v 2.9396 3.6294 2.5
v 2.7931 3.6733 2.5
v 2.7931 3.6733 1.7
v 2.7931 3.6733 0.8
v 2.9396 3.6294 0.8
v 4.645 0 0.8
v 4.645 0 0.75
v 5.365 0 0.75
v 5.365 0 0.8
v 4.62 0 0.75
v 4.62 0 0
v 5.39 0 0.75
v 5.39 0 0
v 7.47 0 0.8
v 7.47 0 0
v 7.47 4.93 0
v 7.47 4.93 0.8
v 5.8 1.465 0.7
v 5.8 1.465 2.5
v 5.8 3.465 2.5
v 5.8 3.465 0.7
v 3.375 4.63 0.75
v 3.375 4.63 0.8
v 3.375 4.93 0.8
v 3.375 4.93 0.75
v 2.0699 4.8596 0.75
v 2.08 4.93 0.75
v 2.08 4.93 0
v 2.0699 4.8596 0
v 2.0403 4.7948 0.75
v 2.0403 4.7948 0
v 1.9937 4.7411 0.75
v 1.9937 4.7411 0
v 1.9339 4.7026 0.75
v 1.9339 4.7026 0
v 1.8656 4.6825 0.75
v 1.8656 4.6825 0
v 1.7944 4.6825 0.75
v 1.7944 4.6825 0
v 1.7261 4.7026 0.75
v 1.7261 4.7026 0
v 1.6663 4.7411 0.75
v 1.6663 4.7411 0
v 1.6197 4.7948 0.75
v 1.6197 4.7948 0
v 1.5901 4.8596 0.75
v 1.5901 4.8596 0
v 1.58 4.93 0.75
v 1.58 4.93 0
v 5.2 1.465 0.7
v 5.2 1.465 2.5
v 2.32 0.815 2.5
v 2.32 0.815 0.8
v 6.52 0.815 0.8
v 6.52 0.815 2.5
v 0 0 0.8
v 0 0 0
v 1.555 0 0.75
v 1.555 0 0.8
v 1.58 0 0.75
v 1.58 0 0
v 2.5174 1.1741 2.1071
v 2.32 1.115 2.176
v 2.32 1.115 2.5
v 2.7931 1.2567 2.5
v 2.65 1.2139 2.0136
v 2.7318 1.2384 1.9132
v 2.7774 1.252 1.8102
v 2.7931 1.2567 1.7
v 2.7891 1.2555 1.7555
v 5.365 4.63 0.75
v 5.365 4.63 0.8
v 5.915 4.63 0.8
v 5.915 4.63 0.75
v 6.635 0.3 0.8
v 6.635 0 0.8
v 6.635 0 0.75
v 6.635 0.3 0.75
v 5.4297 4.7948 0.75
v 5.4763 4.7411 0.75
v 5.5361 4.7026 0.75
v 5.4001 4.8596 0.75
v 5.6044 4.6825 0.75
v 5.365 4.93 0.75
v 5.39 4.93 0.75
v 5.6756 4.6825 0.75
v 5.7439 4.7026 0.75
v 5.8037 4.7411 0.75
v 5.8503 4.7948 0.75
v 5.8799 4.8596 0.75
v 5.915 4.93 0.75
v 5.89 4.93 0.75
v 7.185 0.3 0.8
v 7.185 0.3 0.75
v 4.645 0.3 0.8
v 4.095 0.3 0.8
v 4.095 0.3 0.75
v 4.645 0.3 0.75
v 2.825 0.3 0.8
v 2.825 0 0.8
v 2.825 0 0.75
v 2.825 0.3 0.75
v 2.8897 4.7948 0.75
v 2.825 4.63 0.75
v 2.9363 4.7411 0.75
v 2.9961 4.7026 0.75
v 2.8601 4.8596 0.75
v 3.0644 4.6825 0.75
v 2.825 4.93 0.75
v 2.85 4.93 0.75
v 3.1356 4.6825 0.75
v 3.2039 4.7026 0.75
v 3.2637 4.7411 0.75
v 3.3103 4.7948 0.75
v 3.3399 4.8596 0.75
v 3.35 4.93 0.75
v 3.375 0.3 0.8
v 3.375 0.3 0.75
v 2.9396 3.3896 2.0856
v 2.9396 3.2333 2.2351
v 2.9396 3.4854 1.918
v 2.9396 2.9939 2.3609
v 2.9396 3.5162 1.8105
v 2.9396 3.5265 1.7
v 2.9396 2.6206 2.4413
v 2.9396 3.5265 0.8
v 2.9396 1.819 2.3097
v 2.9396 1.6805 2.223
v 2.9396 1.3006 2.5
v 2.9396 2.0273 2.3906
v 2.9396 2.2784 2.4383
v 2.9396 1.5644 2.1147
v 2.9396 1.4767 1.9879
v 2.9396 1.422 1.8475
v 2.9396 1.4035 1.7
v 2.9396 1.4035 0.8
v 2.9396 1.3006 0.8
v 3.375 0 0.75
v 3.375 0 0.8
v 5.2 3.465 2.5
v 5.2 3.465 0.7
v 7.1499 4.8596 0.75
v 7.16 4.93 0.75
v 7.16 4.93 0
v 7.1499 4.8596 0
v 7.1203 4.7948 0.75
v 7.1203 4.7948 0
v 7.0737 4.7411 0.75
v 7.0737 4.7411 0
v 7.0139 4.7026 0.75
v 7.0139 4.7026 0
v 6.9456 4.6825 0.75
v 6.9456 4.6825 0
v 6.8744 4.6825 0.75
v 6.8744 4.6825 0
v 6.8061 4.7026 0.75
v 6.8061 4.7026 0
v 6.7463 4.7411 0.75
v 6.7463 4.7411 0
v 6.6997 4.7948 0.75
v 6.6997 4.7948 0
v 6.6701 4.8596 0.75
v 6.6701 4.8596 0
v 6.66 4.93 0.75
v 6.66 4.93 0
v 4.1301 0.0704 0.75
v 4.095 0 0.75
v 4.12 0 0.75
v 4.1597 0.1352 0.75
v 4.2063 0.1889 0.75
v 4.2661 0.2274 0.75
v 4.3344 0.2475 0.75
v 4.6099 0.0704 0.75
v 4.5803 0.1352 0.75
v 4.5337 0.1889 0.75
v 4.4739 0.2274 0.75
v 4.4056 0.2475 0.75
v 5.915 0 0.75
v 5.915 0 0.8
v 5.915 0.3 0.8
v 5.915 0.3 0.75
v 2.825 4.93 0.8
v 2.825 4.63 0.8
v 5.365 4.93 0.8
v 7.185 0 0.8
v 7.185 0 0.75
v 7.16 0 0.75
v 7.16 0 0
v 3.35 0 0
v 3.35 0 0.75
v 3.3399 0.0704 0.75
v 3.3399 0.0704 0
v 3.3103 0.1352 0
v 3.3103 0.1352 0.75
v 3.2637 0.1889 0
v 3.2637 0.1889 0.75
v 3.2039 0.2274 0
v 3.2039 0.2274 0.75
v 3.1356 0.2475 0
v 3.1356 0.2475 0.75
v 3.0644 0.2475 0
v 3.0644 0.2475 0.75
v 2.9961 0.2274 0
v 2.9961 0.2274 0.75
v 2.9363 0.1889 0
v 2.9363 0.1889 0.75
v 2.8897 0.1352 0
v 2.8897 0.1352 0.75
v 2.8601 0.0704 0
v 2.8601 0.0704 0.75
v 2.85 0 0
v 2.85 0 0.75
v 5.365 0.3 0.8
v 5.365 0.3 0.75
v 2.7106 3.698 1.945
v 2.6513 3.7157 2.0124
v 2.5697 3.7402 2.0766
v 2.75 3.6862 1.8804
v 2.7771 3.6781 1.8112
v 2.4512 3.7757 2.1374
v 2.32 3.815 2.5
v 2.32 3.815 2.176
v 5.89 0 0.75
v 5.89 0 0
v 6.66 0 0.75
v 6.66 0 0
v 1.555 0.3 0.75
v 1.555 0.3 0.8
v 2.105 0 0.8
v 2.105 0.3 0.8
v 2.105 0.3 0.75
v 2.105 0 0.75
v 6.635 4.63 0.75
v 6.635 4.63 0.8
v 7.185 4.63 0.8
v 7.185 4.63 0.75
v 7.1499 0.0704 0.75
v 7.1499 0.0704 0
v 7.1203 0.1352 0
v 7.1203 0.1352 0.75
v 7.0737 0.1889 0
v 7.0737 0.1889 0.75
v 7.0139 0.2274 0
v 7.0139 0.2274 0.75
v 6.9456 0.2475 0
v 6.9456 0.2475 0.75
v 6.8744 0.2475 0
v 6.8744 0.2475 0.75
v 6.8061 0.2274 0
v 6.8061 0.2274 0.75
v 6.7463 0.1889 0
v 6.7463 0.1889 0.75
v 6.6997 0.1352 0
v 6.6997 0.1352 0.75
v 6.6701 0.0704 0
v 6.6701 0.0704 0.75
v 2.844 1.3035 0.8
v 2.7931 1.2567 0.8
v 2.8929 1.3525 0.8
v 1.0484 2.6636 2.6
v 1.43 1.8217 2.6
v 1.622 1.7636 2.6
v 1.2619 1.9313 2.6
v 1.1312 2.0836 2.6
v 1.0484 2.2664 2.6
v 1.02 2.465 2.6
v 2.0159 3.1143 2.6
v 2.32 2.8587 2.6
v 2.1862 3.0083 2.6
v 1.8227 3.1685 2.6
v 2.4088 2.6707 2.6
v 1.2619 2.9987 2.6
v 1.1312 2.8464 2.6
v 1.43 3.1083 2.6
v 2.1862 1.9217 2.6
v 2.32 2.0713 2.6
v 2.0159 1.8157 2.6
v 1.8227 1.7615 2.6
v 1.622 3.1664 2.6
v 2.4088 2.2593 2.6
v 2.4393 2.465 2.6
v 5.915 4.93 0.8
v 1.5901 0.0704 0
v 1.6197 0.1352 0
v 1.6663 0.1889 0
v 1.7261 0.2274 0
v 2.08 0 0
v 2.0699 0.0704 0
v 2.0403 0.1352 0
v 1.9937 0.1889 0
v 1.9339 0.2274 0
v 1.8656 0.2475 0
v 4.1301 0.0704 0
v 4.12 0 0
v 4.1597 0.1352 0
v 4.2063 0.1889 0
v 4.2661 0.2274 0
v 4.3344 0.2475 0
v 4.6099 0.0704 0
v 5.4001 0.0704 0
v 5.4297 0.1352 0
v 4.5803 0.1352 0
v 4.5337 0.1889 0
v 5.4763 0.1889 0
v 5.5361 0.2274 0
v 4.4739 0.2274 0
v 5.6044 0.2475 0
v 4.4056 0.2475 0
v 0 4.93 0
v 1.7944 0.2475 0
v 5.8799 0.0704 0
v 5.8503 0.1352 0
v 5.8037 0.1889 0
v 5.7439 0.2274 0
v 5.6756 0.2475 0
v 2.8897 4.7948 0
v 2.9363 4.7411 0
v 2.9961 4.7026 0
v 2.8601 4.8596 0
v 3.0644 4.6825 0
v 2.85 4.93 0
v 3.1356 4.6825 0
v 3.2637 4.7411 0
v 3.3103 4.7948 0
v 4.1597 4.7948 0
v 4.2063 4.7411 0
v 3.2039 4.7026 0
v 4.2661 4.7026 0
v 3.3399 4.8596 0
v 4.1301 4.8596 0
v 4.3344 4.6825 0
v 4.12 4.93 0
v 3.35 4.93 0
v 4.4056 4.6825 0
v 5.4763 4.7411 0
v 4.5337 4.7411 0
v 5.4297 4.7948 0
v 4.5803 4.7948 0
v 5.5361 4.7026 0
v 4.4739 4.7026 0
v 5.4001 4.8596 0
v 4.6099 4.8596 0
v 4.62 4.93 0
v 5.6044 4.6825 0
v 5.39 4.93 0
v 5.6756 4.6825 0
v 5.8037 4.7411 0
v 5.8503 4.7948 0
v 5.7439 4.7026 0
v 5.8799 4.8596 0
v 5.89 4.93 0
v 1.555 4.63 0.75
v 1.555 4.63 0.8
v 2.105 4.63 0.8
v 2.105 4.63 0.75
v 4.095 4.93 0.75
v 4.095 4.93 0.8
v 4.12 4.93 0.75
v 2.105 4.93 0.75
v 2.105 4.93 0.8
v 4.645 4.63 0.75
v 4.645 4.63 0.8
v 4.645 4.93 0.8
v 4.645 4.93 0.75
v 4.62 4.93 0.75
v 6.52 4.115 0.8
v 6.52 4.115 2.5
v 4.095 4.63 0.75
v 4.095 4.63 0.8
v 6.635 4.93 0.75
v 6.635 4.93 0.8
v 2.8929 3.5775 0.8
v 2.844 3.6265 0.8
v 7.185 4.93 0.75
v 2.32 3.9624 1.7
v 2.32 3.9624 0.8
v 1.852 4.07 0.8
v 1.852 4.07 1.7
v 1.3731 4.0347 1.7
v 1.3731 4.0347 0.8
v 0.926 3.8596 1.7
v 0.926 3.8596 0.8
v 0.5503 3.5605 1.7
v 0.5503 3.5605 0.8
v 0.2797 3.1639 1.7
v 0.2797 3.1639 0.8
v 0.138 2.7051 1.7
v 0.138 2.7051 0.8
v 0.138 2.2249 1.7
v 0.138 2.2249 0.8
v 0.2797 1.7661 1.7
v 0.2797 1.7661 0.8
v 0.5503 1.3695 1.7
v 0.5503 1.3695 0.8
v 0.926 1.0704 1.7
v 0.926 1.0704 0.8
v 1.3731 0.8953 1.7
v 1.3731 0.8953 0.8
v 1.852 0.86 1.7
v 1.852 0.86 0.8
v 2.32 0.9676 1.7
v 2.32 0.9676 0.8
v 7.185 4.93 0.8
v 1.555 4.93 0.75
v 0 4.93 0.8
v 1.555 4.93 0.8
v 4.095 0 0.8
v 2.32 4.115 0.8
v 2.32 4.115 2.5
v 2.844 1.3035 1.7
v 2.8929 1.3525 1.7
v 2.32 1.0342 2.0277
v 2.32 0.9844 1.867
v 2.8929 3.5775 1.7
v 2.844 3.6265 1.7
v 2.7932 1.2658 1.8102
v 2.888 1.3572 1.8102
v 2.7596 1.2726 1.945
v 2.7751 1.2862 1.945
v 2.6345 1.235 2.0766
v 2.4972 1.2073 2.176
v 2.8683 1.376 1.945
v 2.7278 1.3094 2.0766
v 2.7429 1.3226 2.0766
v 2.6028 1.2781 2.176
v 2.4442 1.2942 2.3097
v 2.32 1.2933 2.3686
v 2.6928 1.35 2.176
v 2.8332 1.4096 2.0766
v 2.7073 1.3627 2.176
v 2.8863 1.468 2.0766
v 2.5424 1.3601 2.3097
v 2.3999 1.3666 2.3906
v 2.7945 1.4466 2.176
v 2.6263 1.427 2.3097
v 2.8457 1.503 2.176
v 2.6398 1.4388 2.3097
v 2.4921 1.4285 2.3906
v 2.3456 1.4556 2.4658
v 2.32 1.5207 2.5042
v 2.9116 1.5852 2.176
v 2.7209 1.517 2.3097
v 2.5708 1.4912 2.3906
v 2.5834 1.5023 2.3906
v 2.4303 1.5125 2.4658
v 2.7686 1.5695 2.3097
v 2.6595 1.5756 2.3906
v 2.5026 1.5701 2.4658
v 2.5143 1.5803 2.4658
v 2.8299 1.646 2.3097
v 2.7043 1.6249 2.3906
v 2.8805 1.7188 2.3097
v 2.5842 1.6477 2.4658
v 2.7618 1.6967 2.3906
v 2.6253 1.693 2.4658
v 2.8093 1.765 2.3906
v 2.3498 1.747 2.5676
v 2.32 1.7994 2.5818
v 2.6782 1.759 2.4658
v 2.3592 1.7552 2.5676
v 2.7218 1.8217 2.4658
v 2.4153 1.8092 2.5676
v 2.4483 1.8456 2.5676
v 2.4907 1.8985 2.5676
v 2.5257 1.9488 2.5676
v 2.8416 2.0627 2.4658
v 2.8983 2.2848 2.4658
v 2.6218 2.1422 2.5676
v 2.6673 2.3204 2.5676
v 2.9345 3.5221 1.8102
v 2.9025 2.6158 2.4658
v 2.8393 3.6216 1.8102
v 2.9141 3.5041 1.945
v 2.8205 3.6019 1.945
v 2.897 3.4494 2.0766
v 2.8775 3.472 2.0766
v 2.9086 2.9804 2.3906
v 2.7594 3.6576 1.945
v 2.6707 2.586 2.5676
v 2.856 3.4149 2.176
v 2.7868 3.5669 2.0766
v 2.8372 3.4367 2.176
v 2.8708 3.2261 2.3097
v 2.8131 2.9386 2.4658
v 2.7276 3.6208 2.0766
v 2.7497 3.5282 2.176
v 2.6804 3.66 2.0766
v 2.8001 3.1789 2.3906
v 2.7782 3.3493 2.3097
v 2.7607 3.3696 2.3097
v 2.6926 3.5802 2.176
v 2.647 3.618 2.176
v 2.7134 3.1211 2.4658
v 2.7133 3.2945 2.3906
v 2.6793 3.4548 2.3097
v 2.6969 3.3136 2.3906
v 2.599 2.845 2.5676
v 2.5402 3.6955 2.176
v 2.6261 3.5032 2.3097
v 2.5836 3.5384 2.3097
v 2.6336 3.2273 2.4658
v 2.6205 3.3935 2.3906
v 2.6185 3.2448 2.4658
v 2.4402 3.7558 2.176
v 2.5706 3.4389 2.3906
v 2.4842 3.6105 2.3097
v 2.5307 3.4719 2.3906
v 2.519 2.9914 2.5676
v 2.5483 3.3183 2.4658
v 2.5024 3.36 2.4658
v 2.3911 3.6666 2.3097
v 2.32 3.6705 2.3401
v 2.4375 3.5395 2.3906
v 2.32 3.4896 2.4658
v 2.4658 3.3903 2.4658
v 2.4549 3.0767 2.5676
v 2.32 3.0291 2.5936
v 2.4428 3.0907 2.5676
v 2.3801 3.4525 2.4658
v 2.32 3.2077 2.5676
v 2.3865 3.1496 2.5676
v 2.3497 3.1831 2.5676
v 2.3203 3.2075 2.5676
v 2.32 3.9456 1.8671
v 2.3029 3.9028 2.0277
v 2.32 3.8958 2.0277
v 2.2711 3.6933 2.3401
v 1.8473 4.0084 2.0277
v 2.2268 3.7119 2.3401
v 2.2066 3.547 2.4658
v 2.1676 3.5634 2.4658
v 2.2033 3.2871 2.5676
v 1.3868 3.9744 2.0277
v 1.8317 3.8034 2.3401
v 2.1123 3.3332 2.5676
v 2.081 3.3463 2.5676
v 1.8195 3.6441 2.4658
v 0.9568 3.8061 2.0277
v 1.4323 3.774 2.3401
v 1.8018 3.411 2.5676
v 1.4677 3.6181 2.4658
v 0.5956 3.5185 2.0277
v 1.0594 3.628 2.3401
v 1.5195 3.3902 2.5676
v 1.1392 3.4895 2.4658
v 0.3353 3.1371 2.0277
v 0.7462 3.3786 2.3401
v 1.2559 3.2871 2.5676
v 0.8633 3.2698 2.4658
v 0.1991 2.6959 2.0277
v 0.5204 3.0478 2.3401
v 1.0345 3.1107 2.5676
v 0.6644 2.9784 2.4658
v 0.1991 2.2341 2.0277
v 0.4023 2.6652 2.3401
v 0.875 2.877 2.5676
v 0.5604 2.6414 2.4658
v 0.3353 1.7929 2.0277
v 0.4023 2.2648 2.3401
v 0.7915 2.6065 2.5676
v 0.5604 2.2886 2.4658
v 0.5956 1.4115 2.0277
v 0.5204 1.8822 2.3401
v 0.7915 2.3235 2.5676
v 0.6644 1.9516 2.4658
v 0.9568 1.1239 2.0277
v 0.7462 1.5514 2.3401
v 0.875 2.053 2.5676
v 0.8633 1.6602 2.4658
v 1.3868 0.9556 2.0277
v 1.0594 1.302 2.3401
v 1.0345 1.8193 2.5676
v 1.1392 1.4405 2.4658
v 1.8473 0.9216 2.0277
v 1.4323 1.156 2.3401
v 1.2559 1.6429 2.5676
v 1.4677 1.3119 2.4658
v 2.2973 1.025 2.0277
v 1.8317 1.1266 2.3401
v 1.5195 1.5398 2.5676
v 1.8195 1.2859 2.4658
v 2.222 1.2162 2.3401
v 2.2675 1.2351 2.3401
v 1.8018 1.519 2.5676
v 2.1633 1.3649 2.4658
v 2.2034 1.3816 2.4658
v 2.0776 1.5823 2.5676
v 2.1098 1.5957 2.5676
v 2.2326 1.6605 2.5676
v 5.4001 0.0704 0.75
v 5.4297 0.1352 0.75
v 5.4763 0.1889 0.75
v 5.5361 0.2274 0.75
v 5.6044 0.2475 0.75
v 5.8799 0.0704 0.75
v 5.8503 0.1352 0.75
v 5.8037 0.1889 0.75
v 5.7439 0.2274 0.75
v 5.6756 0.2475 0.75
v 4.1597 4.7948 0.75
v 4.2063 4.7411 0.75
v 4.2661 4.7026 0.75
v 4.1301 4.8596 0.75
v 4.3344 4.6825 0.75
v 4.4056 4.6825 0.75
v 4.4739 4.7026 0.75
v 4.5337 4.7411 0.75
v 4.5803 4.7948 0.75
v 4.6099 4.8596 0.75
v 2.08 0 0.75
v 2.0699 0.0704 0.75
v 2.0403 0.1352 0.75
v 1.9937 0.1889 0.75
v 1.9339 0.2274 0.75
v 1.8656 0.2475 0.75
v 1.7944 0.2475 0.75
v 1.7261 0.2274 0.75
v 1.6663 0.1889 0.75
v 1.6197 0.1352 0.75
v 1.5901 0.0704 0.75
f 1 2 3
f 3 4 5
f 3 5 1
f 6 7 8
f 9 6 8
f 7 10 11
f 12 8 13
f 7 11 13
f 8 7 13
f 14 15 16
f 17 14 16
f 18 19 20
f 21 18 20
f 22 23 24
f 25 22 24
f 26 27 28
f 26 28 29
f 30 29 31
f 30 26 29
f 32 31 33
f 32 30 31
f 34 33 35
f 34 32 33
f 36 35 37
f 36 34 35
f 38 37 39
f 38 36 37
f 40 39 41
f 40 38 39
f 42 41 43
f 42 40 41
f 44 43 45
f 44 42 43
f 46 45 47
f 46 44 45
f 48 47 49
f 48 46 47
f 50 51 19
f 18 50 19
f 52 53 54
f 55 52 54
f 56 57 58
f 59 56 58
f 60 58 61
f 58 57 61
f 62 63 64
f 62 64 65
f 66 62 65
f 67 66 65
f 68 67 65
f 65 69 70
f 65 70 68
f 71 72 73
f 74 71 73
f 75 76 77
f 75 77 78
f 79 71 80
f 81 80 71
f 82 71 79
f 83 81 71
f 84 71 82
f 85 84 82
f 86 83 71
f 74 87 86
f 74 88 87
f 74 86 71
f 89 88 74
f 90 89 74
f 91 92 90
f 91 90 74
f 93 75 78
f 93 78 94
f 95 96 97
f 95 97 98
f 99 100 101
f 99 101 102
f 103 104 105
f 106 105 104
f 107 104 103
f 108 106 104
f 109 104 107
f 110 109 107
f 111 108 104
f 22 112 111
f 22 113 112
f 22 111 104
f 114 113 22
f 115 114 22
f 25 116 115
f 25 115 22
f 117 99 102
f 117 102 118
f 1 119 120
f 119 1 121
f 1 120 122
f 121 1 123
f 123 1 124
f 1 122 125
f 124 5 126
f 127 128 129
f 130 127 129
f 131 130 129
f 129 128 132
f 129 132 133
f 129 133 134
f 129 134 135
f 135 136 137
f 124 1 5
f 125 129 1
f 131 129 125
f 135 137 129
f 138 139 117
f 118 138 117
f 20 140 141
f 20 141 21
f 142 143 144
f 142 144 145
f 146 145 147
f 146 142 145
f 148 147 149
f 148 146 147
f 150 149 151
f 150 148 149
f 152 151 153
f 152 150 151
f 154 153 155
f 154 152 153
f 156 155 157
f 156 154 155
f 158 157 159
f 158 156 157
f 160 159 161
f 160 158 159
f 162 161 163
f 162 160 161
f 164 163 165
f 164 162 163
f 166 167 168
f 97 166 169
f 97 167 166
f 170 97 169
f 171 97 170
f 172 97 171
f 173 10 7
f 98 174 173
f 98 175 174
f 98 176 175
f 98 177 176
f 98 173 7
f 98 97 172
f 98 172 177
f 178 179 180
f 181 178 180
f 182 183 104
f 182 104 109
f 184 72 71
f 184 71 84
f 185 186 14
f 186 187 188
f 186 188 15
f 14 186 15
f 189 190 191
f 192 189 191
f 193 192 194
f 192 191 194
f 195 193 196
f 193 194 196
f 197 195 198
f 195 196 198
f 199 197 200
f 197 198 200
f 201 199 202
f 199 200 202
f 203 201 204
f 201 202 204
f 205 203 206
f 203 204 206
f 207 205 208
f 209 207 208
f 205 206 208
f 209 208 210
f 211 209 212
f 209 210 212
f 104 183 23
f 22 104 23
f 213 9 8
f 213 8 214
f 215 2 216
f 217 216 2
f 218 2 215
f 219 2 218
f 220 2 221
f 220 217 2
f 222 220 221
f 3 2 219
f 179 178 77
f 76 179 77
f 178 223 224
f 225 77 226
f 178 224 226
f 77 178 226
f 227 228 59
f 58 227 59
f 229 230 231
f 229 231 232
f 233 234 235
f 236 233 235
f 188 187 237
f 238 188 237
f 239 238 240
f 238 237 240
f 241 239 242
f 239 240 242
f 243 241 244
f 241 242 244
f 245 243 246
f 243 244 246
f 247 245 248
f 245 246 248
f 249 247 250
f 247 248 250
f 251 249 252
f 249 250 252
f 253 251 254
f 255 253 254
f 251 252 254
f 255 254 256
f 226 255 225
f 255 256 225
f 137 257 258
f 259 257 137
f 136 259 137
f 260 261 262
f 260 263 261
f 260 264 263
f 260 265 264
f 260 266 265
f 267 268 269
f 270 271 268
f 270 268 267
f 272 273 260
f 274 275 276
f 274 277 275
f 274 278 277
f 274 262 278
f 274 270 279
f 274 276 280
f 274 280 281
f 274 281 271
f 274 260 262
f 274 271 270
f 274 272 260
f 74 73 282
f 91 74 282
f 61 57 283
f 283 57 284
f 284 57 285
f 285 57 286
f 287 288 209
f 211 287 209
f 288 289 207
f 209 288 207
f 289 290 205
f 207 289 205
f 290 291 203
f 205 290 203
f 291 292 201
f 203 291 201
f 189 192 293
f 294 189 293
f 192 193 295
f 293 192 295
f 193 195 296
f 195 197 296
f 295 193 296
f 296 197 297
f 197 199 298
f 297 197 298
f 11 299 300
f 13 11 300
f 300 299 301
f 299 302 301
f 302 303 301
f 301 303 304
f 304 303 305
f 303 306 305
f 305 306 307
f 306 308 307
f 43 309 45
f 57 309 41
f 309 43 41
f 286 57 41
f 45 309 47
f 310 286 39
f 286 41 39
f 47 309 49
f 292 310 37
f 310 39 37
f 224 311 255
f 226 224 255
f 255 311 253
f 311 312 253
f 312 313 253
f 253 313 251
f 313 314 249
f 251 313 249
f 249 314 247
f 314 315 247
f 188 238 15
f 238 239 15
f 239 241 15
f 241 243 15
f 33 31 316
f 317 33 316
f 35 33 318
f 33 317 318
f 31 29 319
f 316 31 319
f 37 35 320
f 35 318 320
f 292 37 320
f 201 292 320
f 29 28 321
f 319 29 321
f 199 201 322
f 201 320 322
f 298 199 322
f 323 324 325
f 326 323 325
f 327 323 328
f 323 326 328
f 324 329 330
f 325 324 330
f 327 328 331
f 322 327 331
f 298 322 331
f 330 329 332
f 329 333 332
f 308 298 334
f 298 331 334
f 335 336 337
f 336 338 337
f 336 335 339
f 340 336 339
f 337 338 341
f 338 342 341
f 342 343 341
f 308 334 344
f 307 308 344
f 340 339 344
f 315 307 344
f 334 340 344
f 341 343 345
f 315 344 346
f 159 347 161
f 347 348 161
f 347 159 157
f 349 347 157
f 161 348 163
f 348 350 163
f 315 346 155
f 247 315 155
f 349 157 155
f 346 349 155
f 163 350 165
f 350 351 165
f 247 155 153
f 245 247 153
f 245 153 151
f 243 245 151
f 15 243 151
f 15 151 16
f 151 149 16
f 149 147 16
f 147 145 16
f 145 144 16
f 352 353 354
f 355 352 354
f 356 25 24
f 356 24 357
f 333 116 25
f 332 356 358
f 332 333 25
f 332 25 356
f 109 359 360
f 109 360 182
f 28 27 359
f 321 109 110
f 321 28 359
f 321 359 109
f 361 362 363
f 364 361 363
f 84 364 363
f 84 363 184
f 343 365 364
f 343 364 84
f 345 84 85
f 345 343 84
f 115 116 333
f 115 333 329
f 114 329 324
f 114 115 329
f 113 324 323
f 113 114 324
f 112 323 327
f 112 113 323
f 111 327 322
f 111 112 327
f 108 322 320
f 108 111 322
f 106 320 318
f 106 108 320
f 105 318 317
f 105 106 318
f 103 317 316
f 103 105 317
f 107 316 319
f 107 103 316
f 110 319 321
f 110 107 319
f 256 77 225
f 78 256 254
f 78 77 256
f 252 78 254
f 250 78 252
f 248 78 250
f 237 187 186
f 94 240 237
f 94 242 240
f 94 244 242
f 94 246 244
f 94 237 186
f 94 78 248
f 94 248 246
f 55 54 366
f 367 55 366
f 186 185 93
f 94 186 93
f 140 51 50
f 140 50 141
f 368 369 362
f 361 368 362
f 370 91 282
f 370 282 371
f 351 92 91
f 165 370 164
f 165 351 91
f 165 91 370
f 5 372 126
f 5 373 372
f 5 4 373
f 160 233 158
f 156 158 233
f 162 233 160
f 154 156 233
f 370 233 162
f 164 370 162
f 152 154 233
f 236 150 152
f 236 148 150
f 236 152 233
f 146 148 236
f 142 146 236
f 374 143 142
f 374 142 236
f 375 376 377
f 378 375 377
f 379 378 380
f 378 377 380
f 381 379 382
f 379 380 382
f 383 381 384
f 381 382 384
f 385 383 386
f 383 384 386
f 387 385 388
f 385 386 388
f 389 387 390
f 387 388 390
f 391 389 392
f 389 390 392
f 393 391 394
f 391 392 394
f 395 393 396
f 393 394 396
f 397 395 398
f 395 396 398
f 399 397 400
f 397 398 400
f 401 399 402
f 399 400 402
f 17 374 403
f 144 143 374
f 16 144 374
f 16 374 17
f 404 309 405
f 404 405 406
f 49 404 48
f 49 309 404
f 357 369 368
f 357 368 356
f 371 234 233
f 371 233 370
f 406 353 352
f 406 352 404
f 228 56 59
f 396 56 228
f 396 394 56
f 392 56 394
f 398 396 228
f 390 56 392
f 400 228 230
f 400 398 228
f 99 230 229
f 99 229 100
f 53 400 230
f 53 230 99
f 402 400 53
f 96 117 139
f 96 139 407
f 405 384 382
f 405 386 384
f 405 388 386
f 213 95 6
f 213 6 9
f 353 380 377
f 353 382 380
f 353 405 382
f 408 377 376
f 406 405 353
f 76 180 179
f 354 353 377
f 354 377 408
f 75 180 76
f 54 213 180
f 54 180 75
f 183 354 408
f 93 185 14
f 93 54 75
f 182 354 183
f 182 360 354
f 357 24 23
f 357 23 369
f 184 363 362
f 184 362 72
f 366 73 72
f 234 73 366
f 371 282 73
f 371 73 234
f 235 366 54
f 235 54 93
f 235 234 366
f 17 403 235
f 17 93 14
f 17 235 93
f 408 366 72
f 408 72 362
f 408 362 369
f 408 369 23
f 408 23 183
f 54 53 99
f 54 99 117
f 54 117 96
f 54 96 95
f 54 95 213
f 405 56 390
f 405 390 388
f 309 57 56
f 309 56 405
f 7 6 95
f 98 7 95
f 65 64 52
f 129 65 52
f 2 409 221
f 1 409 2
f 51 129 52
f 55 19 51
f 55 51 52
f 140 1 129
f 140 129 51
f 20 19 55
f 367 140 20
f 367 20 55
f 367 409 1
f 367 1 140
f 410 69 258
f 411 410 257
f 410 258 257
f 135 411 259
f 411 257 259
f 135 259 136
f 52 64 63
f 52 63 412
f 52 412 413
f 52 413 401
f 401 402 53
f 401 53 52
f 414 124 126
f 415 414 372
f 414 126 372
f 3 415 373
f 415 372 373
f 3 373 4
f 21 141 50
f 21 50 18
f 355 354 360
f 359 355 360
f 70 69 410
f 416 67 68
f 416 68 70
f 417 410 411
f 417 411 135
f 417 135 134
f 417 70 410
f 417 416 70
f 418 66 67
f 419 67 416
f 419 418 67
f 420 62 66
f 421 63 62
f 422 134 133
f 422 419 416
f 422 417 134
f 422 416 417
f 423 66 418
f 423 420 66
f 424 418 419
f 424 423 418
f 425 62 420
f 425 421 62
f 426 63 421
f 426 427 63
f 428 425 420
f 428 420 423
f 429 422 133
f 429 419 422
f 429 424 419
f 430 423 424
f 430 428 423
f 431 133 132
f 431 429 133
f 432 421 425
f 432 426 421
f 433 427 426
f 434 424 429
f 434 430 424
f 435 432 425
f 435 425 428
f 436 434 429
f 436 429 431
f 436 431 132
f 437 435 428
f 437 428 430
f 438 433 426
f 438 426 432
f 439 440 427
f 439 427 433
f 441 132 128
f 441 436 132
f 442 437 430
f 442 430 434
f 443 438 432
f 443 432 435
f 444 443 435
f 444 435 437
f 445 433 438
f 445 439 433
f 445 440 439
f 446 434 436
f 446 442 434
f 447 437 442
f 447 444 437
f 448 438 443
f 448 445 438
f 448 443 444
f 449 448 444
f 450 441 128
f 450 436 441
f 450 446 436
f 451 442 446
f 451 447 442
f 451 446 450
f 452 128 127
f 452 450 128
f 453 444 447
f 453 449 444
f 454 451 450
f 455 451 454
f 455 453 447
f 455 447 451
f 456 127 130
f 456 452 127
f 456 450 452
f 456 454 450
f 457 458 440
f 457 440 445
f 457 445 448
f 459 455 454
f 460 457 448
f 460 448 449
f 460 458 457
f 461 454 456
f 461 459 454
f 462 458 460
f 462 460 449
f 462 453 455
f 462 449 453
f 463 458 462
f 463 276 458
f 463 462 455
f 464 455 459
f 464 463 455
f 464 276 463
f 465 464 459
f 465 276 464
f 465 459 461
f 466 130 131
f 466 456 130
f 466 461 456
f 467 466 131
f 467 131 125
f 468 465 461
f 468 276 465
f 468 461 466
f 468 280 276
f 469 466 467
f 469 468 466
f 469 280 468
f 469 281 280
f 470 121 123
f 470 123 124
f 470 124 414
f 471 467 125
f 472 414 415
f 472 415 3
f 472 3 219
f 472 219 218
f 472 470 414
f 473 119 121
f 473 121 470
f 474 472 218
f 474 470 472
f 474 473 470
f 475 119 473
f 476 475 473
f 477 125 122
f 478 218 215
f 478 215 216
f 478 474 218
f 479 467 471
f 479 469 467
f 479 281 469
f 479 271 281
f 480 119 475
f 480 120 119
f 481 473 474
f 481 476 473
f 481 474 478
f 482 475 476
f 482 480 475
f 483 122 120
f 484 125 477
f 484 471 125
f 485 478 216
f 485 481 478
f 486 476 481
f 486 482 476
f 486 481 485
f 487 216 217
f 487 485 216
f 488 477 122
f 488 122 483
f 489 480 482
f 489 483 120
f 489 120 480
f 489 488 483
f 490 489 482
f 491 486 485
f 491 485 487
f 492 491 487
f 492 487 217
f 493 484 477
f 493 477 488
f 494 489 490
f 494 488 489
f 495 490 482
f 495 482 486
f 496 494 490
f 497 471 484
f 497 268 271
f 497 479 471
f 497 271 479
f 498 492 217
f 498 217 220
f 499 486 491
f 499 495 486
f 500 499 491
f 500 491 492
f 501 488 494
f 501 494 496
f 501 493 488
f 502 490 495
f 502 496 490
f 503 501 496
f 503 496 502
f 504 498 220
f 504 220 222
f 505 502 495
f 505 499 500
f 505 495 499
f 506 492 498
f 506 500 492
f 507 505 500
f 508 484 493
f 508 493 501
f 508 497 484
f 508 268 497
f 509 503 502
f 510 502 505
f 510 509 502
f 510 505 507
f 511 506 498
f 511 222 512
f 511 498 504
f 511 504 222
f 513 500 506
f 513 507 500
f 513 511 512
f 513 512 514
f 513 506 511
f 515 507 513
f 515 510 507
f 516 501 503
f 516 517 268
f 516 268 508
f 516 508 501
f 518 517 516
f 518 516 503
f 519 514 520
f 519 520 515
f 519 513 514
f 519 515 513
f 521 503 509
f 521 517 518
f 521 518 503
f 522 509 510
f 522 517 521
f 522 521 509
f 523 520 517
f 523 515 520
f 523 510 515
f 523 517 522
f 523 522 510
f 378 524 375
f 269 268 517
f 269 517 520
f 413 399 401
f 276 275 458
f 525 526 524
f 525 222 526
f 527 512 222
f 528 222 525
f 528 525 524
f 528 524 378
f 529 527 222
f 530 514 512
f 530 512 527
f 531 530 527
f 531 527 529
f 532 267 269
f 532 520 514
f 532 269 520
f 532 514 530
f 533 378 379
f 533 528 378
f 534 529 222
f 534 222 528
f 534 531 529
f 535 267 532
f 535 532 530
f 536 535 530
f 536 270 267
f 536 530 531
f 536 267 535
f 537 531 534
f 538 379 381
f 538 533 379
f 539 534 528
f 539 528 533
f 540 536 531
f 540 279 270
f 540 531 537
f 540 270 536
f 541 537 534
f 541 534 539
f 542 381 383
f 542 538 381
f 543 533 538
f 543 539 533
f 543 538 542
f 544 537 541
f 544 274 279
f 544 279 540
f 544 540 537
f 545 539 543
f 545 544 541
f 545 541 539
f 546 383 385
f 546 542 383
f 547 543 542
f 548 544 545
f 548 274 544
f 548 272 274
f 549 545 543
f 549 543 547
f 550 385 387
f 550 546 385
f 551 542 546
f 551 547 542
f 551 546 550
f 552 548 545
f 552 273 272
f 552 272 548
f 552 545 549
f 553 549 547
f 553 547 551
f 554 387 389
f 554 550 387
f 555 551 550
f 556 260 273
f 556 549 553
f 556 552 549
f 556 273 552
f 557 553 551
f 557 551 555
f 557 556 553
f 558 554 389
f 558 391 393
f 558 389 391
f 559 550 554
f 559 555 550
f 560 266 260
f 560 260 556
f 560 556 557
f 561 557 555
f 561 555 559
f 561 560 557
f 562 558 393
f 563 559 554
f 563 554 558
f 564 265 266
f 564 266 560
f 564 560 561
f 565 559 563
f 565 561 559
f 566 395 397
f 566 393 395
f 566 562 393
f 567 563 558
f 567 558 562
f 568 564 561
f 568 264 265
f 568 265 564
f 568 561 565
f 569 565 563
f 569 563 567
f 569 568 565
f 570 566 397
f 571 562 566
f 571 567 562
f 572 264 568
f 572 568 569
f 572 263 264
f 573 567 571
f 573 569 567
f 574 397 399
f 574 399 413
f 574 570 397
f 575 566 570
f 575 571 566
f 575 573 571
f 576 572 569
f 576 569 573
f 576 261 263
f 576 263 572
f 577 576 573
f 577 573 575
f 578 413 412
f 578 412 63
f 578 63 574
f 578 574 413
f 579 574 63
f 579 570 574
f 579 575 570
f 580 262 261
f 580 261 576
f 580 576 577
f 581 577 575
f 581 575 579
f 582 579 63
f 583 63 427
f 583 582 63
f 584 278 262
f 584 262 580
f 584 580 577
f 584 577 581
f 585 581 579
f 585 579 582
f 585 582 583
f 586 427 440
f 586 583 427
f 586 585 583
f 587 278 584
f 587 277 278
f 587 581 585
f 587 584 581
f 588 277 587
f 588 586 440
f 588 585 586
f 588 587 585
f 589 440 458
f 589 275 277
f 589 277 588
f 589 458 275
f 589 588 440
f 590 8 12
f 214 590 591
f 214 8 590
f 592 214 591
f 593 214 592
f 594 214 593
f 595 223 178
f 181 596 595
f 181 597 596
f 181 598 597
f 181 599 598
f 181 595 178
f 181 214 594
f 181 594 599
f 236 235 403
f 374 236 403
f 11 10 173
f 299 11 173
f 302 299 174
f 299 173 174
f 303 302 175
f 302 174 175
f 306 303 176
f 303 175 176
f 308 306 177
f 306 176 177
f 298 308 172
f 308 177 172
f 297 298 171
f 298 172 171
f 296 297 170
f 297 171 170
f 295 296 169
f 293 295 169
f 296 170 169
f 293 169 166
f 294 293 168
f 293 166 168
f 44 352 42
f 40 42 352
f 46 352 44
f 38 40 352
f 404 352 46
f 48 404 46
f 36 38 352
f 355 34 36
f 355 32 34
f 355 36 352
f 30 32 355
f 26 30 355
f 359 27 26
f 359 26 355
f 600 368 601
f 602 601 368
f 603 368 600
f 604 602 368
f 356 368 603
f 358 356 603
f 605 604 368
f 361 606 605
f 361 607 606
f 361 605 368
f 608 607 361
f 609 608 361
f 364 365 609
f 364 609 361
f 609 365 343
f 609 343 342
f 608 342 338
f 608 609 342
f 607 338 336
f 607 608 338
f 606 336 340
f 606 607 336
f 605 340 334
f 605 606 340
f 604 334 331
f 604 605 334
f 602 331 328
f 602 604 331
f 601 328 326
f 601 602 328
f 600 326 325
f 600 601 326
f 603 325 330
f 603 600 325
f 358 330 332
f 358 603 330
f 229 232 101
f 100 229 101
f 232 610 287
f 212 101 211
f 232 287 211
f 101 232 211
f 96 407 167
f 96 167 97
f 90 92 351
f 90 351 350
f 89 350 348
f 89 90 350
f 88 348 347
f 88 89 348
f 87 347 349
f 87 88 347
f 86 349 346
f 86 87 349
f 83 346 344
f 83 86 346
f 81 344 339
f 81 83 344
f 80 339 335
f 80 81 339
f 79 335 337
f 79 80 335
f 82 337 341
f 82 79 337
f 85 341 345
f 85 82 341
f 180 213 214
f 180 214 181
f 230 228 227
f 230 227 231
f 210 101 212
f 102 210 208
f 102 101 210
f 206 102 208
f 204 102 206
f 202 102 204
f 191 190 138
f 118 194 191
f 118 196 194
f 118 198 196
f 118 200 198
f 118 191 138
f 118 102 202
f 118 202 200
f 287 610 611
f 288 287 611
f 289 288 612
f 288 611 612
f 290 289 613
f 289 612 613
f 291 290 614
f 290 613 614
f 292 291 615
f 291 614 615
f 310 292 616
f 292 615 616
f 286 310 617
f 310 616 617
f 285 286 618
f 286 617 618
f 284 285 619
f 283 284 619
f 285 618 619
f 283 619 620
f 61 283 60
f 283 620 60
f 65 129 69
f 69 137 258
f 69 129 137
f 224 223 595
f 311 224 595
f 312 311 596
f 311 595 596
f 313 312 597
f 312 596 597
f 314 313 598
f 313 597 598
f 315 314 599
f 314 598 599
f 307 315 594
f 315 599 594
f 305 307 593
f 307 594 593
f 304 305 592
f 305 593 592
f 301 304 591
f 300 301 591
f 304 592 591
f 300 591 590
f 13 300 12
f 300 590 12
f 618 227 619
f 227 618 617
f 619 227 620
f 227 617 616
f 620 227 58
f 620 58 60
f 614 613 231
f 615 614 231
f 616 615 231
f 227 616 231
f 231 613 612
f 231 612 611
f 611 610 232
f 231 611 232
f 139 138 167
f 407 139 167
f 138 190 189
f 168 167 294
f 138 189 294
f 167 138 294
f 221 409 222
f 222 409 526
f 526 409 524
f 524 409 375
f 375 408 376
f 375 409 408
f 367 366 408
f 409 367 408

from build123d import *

# Parameters (mm, degrees)
SKETCH1_W               = 7.47
SKETCH1_H               = 4.93
BOSS_EXTRUDE1_DEPTH     = 0.8
BOSS_EXTRUDE2_DEPTH     = 1.7
SKETCH3_R               = 1.609625666
BOSS_EXTRUDE3_DEPTH     = 1.8
FILLET1_R               = 0.9
SKETCH4_W               = 0.6
SKETCH4_H               = 2
CUT_EXTRUDE1_DEPTH      = 1.8
CUT_EXTRUDE2_DEPTH      = 10.129392113
SKETCH6_W               = 0.55
SKETCH6_H               = 0.3
CUT_EXTRUDE3_DEPTH      = 0.05
LPATTERN1_COUNT         = 5
LPATTERN1_PITCH         = 1.27
MIRROR1_COPY_1_DEPTH    = 10.129392113
MIRROR1_COPY_2_DEPTH    = 10.129392113
MIRROR1_COPY_3_DEPTH    = 10.129392113
MIRROR1_COPY_4_DEPTH    = 10.129392113
MIRROR1_COPY_5_SKETCH_W = 0.55
MIRROR1_COPY_5_SKETCH_H = 0.3
MIRROR1_COPY_5_DEPTH    = 0.05
MIRROR1_COPY_6_SKETCH_W = 0.55
MIRROR1_COPY_6_SKETCH_H = 0.3
MIRROR1_COPY_6_DEPTH    = 0.05
MIRROR1_COPY_7_SKETCH_W = 0.55
MIRROR1_COPY_7_SKETCH_H = 0.3
MIRROR1_COPY_7_DEPTH    = 0.05
MIRROR1_COPY_8_SKETCH_W = 0.55
MIRROR1_COPY_8_SKETCH_H = 0.3
MIRROR1_COPY_8_DEPTH    = 0.05


with BuildPart() as part:
    # Sketch1 → Boss-Extrude1 (new body)
    with BuildSketch(Plane.XY):
        with Locations((3.735, 2.465)):
            Rectangle(SKETCH1_W, SKETCH1_H)
    extrude(amount=BOSS_EXTRUDE1_DEPTH)

    # Sketch2 → Boss-Extrude2 (add)
    with BuildSketch(Plane.XY.offset(0.8)):
        Polygon((2.939618782, 3.62939168), (2.939618782, 1.30060832), (2.32, 1.115), (2.32, 0.815), (6.52, 0.815), (6.52, 4.115), (2.32, 4.115), (2.32, 3.815), align=None)
    extrude(amount=BOSS_EXTRUDE2_DEPTH)

    # Sketch3 → Boss-Extrude3 (add)
    with BuildSketch(Plane.XY.offset(0.8)):
        with Locations(Location((1.729625666, 2.465, 0), (0, 0, 68.482991379))):
            Circle(SKETCH3_R)
    extrude(amount=BOSS_EXTRUDE3_DEPTH)

    # Fillet1
    # the kernel refuses this fillet: 0.9 mm, written as the material it takes off along each edge
    with BuildSketch(Plane(origin=(1.729625666, 2.465, 2.6), x_dir=(0.3667774110162909, 0.9303087287391142, 0), z_dir=(0.9303087287391142, -0.3667774110162909, 0))) as fillet1_piece_1_section:
        with BuildLine():
            CenterArc((1.609625666 - FILLET1_R, -FILLET1_R), FILLET1_R, 0, 90)
            Line((1.609625666 - FILLET1_R, 0), (1.609625666, 0))
            Line((1.609625666, 0), (1.609625666, -FILLET1_R))
        make_face()
    fillet1_piece_1 = revolve(axis=Axis((1.729625666, 2.465, 2.6), (0, 0, 1)), mode=Mode.PRIVATE)
    fillet1_piece_1 = split(fillet1_piece_1, bisect_by=Plane(origin=(2.32, 3.98462035, 2.239901454), z_dir=(-1, 0, 0)), keep=Keep.TOP, mode=Mode.PRIVATE)
    add(fillet1_piece_1, mode=Mode.SUBTRACT)
    with BuildSketch(Plane(origin=(1.729625666, 2.465, 2.6), x_dir=(0.3667774110162909, 0.9303087287391142, 0), z_dir=(0.9303087287391142, -0.3667774110162909, 0))) as fillet1_piece_2_section:
        with BuildLine():
            CenterArc((1.609625666 - FILLET1_R, -FILLET1_R), FILLET1_R, 0, 90)
            Line((1.609625666 - FILLET1_R, 0), (1.609625666, 0))
            Line((1.609625666, 0), (1.609625666, -FILLET1_R))
        make_face()
    fillet1_piece_2 = revolve(axis=Axis((1.729625666, 2.465, 2.6), (0, 0, 1)), mode=Mode.PRIVATE)
    fillet1_piece_2 = split(fillet1_piece_2, bisect_by=Plane(origin=(2.8939742, 1.286935374, 1.864268615), z_dir=(-0.28695452749278183, 0.9579442046128753, 0)), keep=Keep.TOP, mode=Mode.PRIVATE)
    fillet1_piece_2 = split(fillet1_piece_2, bisect_by=Plane(origin=(2.939618782, 1.348625417, 1.864268615), z_dir=(-1, 0, 0)), keep=Keep.TOP, mode=Mode.PRIVATE)
    fillet1_piece_2 = split(fillet1_piece_2, bisect_by=Plane(origin=(3.507726639, 3.459213583, 1.864268615), z_dir=(-0.28695452749278183, -0.9579442046128753, 0)), keep=Keep.TOP, mode=Mode.PRIVATE)
    add(fillet1_piece_2, mode=Mode.SUBTRACT)
    with BuildSketch(Plane(origin=(1.729625666, 2.465, 2.6), x_dir=(0.3667774110162909, 0.9303087287391142, 0), z_dir=(0.9303087287391142, -0.3667774110162909, 0))) as fillet1_piece_3_section:
        with BuildLine():
            CenterArc((1.609625666 - FILLET1_R, -FILLET1_R), FILLET1_R, 0, 90)
            Line((1.609625666 - FILLET1_R, 0), (1.609625666, 0))
            Line((1.609625666, 0), (1.609625666, -FILLET1_R))
        make_face()
    fillet1_piece_3 = revolve(axis=Axis((1.729625666, 2.465, 2.6), (0, 0, 1)), mode=Mode.PRIVATE)
    fillet1_piece_3 = split(fillet1_piece_3, bisect_by=Plane(origin=(2.494750344, 3.818777252, 2.5), z_dir=(0, 0, 1)), keep=Keep.TOP, mode=Mode.PRIVATE)
    add(fillet1_piece_3, mode=Mode.SUBTRACT)

    # Sketch4 → Cut-Extrude1 (cut)
    with BuildSketch(Plane.XY.offset(2.5)):
        with Locations((5.5, 2.465)):
            Rectangle(SKETCH4_W, SKETCH4_H)
    extrude(amount=-CUT_EXTRUDE1_DEPTH, mode=Mode.SUBTRACT)

    # Sketch5 → Cut-Extrude2 (cut, through all)
    with BuildSketch(Plane.XY.offset(0.8)):
        with BuildLine():
            Line((1.58, 4.93), (2.08, 4.93))
            ThreePointArc((2.08, 4.93), (1.83, 4.68), (1.58, 4.93))
        make_face()
    cut_extrude2 = extrude(amount=-CUT_EXTRUDE2_DEPTH, mode=Mode.SUBTRACT)

    # Sketch6 → Cut-Extrude3 (cut)
    with BuildSketch(Plane.XY.offset(0.8)):
        with Locations((1.83, 4.78)):
            Rectangle(SKETCH6_W, SKETCH6_H)
    cut_extrude3 = extrude(amount=-CUT_EXTRUDE3_DEPTH, mode=Mode.SUBTRACT)

    # LPattern1: Cut-Extrude2, Cut-Extrude3 ×5
    with Locations(*[(i * LPATTERN1_PITCH, 0, 0) for i in range(1, LPATTERN1_COUNT)]):
        add(cut_extrude2, mode=Mode.SUBTRACT)
        add(cut_extrude3, mode=Mode.SUBTRACT)

    # Mirror1: Cut-Extrude2, Cut-Extrude3 across plane
    add(cut_extrude2.mirror(Plane.ZX.offset(2.465)), mode=Mode.SUBTRACT)
    add(cut_extrude3.mirror(Plane.ZX.offset(2.465)), mode=Mode.SUBTRACT)

    # Mirror1 copy 1 sketch → Mirror1 copy 1 (cut, through all)
    with BuildSketch(Plane(origin=(1.27, 4.93, 0.8), x_dir=(1, 0, 0), z_dir=(0, 0, 1))):
        with BuildLine():
            Line((1.58, -4.93), (2.08, -4.93))
            ThreePointArc((2.08, -4.93), (1.83, -4.68), (1.58, -4.93))
        make_face()
    extrude(amount=-MIRROR1_COPY_1_DEPTH, mode=Mode.SUBTRACT)

    # Mirror1 copy 2 sketch → Mirror1 copy 2 (cut, through all)
    with BuildSketch(Plane(origin=(2.54, 4.93, 0.8), x_dir=(1, 0, 0), z_dir=(0, 0, 1))):
        with BuildLine():
            Line((1.58, -4.93), (2.08, -4.93))
            ThreePointArc((2.08, -4.93), (1.83, -4.68), (1.58, -4.93))
        make_face()
    extrude(amount=-MIRROR1_COPY_2_DEPTH, mode=Mode.SUBTRACT)

    # Mirror1 copy 3 sketch → Mirror1 copy 3 (cut, through all)
    with BuildSketch(Plane(origin=(3.81, 4.93, 0.8), x_dir=(1, 0, 0), z_dir=(0, 0, 1))):
        with BuildLine():
            Line((1.58, -4.93), (2.08, -4.93))
            ThreePointArc((2.08, -4.93), (1.83, -4.68), (1.58, -4.93))
        make_face()
    extrude(amount=-MIRROR1_COPY_3_DEPTH, mode=Mode.SUBTRACT)

    # Mirror1 copy 4 sketch → Mirror1 copy 4 (cut, through all)
    with BuildSketch(Plane(origin=(5.08, 4.93, 0.8), x_dir=(1, 0, 0), z_dir=(0, 0, 1))):
        with BuildLine():
            Line((1.58, -4.93), (2.08, -4.93))
            ThreePointArc((2.08, -4.93), (1.83, -4.68), (1.58, -4.93))
        make_face()
    extrude(amount=-MIRROR1_COPY_4_DEPTH, mode=Mode.SUBTRACT)

    # Mirror1 copy 5 sketch → Mirror1 copy 5 (cut)
    with BuildSketch(Plane(origin=(1.27, 4.93, 0.8), x_dir=(1, 0, 0), z_dir=(0, 0, 1))):
        with Locations((1.83, -4.78)):
            Rectangle(MIRROR1_COPY_5_SKETCH_W, MIRROR1_COPY_5_SKETCH_H)
    extrude(amount=-MIRROR1_COPY_5_DEPTH, mode=Mode.SUBTRACT)

    # Mirror1 copy 6 sketch → Mirror1 copy 6 (cut)
    with BuildSketch(Plane(origin=(2.54, 4.93, 0.8), x_dir=(1, 0, 0), z_dir=(0, 0, 1))):
        with Locations((1.83, -4.78)):
            Rectangle(MIRROR1_COPY_6_SKETCH_W, MIRROR1_COPY_6_SKETCH_H)
    extrude(amount=-MIRROR1_COPY_6_DEPTH, mode=Mode.SUBTRACT)

    # Mirror1 copy 7 sketch → Mirror1 copy 7 (cut)
    with BuildSketch(Plane(origin=(3.81, 4.93, 0.8), x_dir=(1, 0, 0), z_dir=(0, 0, 1))):
        with Locations((1.83, -4.78)):
            Rectangle(MIRROR1_COPY_7_SKETCH_W, MIRROR1_COPY_7_SKETCH_H)
    extrude(amount=-MIRROR1_COPY_7_DEPTH, mode=Mode.SUBTRACT)

    # Mirror1 copy 8 sketch → Mirror1 copy 8 (cut)
    with BuildSketch(Plane(origin=(5.08, 4.93, 0.8), x_dir=(1, 0, 0), z_dir=(0, 0, 1))):
        with Locations((1.83, -4.78)):
            Rectangle(MIRROR1_COPY_8_SKETCH_W, MIRROR1_COPY_8_SKETCH_H)
    extrude(amount=-MIRROR1_COPY_8_DEPTH, mode=Mode.SUBTRACT)


solid = part.part
